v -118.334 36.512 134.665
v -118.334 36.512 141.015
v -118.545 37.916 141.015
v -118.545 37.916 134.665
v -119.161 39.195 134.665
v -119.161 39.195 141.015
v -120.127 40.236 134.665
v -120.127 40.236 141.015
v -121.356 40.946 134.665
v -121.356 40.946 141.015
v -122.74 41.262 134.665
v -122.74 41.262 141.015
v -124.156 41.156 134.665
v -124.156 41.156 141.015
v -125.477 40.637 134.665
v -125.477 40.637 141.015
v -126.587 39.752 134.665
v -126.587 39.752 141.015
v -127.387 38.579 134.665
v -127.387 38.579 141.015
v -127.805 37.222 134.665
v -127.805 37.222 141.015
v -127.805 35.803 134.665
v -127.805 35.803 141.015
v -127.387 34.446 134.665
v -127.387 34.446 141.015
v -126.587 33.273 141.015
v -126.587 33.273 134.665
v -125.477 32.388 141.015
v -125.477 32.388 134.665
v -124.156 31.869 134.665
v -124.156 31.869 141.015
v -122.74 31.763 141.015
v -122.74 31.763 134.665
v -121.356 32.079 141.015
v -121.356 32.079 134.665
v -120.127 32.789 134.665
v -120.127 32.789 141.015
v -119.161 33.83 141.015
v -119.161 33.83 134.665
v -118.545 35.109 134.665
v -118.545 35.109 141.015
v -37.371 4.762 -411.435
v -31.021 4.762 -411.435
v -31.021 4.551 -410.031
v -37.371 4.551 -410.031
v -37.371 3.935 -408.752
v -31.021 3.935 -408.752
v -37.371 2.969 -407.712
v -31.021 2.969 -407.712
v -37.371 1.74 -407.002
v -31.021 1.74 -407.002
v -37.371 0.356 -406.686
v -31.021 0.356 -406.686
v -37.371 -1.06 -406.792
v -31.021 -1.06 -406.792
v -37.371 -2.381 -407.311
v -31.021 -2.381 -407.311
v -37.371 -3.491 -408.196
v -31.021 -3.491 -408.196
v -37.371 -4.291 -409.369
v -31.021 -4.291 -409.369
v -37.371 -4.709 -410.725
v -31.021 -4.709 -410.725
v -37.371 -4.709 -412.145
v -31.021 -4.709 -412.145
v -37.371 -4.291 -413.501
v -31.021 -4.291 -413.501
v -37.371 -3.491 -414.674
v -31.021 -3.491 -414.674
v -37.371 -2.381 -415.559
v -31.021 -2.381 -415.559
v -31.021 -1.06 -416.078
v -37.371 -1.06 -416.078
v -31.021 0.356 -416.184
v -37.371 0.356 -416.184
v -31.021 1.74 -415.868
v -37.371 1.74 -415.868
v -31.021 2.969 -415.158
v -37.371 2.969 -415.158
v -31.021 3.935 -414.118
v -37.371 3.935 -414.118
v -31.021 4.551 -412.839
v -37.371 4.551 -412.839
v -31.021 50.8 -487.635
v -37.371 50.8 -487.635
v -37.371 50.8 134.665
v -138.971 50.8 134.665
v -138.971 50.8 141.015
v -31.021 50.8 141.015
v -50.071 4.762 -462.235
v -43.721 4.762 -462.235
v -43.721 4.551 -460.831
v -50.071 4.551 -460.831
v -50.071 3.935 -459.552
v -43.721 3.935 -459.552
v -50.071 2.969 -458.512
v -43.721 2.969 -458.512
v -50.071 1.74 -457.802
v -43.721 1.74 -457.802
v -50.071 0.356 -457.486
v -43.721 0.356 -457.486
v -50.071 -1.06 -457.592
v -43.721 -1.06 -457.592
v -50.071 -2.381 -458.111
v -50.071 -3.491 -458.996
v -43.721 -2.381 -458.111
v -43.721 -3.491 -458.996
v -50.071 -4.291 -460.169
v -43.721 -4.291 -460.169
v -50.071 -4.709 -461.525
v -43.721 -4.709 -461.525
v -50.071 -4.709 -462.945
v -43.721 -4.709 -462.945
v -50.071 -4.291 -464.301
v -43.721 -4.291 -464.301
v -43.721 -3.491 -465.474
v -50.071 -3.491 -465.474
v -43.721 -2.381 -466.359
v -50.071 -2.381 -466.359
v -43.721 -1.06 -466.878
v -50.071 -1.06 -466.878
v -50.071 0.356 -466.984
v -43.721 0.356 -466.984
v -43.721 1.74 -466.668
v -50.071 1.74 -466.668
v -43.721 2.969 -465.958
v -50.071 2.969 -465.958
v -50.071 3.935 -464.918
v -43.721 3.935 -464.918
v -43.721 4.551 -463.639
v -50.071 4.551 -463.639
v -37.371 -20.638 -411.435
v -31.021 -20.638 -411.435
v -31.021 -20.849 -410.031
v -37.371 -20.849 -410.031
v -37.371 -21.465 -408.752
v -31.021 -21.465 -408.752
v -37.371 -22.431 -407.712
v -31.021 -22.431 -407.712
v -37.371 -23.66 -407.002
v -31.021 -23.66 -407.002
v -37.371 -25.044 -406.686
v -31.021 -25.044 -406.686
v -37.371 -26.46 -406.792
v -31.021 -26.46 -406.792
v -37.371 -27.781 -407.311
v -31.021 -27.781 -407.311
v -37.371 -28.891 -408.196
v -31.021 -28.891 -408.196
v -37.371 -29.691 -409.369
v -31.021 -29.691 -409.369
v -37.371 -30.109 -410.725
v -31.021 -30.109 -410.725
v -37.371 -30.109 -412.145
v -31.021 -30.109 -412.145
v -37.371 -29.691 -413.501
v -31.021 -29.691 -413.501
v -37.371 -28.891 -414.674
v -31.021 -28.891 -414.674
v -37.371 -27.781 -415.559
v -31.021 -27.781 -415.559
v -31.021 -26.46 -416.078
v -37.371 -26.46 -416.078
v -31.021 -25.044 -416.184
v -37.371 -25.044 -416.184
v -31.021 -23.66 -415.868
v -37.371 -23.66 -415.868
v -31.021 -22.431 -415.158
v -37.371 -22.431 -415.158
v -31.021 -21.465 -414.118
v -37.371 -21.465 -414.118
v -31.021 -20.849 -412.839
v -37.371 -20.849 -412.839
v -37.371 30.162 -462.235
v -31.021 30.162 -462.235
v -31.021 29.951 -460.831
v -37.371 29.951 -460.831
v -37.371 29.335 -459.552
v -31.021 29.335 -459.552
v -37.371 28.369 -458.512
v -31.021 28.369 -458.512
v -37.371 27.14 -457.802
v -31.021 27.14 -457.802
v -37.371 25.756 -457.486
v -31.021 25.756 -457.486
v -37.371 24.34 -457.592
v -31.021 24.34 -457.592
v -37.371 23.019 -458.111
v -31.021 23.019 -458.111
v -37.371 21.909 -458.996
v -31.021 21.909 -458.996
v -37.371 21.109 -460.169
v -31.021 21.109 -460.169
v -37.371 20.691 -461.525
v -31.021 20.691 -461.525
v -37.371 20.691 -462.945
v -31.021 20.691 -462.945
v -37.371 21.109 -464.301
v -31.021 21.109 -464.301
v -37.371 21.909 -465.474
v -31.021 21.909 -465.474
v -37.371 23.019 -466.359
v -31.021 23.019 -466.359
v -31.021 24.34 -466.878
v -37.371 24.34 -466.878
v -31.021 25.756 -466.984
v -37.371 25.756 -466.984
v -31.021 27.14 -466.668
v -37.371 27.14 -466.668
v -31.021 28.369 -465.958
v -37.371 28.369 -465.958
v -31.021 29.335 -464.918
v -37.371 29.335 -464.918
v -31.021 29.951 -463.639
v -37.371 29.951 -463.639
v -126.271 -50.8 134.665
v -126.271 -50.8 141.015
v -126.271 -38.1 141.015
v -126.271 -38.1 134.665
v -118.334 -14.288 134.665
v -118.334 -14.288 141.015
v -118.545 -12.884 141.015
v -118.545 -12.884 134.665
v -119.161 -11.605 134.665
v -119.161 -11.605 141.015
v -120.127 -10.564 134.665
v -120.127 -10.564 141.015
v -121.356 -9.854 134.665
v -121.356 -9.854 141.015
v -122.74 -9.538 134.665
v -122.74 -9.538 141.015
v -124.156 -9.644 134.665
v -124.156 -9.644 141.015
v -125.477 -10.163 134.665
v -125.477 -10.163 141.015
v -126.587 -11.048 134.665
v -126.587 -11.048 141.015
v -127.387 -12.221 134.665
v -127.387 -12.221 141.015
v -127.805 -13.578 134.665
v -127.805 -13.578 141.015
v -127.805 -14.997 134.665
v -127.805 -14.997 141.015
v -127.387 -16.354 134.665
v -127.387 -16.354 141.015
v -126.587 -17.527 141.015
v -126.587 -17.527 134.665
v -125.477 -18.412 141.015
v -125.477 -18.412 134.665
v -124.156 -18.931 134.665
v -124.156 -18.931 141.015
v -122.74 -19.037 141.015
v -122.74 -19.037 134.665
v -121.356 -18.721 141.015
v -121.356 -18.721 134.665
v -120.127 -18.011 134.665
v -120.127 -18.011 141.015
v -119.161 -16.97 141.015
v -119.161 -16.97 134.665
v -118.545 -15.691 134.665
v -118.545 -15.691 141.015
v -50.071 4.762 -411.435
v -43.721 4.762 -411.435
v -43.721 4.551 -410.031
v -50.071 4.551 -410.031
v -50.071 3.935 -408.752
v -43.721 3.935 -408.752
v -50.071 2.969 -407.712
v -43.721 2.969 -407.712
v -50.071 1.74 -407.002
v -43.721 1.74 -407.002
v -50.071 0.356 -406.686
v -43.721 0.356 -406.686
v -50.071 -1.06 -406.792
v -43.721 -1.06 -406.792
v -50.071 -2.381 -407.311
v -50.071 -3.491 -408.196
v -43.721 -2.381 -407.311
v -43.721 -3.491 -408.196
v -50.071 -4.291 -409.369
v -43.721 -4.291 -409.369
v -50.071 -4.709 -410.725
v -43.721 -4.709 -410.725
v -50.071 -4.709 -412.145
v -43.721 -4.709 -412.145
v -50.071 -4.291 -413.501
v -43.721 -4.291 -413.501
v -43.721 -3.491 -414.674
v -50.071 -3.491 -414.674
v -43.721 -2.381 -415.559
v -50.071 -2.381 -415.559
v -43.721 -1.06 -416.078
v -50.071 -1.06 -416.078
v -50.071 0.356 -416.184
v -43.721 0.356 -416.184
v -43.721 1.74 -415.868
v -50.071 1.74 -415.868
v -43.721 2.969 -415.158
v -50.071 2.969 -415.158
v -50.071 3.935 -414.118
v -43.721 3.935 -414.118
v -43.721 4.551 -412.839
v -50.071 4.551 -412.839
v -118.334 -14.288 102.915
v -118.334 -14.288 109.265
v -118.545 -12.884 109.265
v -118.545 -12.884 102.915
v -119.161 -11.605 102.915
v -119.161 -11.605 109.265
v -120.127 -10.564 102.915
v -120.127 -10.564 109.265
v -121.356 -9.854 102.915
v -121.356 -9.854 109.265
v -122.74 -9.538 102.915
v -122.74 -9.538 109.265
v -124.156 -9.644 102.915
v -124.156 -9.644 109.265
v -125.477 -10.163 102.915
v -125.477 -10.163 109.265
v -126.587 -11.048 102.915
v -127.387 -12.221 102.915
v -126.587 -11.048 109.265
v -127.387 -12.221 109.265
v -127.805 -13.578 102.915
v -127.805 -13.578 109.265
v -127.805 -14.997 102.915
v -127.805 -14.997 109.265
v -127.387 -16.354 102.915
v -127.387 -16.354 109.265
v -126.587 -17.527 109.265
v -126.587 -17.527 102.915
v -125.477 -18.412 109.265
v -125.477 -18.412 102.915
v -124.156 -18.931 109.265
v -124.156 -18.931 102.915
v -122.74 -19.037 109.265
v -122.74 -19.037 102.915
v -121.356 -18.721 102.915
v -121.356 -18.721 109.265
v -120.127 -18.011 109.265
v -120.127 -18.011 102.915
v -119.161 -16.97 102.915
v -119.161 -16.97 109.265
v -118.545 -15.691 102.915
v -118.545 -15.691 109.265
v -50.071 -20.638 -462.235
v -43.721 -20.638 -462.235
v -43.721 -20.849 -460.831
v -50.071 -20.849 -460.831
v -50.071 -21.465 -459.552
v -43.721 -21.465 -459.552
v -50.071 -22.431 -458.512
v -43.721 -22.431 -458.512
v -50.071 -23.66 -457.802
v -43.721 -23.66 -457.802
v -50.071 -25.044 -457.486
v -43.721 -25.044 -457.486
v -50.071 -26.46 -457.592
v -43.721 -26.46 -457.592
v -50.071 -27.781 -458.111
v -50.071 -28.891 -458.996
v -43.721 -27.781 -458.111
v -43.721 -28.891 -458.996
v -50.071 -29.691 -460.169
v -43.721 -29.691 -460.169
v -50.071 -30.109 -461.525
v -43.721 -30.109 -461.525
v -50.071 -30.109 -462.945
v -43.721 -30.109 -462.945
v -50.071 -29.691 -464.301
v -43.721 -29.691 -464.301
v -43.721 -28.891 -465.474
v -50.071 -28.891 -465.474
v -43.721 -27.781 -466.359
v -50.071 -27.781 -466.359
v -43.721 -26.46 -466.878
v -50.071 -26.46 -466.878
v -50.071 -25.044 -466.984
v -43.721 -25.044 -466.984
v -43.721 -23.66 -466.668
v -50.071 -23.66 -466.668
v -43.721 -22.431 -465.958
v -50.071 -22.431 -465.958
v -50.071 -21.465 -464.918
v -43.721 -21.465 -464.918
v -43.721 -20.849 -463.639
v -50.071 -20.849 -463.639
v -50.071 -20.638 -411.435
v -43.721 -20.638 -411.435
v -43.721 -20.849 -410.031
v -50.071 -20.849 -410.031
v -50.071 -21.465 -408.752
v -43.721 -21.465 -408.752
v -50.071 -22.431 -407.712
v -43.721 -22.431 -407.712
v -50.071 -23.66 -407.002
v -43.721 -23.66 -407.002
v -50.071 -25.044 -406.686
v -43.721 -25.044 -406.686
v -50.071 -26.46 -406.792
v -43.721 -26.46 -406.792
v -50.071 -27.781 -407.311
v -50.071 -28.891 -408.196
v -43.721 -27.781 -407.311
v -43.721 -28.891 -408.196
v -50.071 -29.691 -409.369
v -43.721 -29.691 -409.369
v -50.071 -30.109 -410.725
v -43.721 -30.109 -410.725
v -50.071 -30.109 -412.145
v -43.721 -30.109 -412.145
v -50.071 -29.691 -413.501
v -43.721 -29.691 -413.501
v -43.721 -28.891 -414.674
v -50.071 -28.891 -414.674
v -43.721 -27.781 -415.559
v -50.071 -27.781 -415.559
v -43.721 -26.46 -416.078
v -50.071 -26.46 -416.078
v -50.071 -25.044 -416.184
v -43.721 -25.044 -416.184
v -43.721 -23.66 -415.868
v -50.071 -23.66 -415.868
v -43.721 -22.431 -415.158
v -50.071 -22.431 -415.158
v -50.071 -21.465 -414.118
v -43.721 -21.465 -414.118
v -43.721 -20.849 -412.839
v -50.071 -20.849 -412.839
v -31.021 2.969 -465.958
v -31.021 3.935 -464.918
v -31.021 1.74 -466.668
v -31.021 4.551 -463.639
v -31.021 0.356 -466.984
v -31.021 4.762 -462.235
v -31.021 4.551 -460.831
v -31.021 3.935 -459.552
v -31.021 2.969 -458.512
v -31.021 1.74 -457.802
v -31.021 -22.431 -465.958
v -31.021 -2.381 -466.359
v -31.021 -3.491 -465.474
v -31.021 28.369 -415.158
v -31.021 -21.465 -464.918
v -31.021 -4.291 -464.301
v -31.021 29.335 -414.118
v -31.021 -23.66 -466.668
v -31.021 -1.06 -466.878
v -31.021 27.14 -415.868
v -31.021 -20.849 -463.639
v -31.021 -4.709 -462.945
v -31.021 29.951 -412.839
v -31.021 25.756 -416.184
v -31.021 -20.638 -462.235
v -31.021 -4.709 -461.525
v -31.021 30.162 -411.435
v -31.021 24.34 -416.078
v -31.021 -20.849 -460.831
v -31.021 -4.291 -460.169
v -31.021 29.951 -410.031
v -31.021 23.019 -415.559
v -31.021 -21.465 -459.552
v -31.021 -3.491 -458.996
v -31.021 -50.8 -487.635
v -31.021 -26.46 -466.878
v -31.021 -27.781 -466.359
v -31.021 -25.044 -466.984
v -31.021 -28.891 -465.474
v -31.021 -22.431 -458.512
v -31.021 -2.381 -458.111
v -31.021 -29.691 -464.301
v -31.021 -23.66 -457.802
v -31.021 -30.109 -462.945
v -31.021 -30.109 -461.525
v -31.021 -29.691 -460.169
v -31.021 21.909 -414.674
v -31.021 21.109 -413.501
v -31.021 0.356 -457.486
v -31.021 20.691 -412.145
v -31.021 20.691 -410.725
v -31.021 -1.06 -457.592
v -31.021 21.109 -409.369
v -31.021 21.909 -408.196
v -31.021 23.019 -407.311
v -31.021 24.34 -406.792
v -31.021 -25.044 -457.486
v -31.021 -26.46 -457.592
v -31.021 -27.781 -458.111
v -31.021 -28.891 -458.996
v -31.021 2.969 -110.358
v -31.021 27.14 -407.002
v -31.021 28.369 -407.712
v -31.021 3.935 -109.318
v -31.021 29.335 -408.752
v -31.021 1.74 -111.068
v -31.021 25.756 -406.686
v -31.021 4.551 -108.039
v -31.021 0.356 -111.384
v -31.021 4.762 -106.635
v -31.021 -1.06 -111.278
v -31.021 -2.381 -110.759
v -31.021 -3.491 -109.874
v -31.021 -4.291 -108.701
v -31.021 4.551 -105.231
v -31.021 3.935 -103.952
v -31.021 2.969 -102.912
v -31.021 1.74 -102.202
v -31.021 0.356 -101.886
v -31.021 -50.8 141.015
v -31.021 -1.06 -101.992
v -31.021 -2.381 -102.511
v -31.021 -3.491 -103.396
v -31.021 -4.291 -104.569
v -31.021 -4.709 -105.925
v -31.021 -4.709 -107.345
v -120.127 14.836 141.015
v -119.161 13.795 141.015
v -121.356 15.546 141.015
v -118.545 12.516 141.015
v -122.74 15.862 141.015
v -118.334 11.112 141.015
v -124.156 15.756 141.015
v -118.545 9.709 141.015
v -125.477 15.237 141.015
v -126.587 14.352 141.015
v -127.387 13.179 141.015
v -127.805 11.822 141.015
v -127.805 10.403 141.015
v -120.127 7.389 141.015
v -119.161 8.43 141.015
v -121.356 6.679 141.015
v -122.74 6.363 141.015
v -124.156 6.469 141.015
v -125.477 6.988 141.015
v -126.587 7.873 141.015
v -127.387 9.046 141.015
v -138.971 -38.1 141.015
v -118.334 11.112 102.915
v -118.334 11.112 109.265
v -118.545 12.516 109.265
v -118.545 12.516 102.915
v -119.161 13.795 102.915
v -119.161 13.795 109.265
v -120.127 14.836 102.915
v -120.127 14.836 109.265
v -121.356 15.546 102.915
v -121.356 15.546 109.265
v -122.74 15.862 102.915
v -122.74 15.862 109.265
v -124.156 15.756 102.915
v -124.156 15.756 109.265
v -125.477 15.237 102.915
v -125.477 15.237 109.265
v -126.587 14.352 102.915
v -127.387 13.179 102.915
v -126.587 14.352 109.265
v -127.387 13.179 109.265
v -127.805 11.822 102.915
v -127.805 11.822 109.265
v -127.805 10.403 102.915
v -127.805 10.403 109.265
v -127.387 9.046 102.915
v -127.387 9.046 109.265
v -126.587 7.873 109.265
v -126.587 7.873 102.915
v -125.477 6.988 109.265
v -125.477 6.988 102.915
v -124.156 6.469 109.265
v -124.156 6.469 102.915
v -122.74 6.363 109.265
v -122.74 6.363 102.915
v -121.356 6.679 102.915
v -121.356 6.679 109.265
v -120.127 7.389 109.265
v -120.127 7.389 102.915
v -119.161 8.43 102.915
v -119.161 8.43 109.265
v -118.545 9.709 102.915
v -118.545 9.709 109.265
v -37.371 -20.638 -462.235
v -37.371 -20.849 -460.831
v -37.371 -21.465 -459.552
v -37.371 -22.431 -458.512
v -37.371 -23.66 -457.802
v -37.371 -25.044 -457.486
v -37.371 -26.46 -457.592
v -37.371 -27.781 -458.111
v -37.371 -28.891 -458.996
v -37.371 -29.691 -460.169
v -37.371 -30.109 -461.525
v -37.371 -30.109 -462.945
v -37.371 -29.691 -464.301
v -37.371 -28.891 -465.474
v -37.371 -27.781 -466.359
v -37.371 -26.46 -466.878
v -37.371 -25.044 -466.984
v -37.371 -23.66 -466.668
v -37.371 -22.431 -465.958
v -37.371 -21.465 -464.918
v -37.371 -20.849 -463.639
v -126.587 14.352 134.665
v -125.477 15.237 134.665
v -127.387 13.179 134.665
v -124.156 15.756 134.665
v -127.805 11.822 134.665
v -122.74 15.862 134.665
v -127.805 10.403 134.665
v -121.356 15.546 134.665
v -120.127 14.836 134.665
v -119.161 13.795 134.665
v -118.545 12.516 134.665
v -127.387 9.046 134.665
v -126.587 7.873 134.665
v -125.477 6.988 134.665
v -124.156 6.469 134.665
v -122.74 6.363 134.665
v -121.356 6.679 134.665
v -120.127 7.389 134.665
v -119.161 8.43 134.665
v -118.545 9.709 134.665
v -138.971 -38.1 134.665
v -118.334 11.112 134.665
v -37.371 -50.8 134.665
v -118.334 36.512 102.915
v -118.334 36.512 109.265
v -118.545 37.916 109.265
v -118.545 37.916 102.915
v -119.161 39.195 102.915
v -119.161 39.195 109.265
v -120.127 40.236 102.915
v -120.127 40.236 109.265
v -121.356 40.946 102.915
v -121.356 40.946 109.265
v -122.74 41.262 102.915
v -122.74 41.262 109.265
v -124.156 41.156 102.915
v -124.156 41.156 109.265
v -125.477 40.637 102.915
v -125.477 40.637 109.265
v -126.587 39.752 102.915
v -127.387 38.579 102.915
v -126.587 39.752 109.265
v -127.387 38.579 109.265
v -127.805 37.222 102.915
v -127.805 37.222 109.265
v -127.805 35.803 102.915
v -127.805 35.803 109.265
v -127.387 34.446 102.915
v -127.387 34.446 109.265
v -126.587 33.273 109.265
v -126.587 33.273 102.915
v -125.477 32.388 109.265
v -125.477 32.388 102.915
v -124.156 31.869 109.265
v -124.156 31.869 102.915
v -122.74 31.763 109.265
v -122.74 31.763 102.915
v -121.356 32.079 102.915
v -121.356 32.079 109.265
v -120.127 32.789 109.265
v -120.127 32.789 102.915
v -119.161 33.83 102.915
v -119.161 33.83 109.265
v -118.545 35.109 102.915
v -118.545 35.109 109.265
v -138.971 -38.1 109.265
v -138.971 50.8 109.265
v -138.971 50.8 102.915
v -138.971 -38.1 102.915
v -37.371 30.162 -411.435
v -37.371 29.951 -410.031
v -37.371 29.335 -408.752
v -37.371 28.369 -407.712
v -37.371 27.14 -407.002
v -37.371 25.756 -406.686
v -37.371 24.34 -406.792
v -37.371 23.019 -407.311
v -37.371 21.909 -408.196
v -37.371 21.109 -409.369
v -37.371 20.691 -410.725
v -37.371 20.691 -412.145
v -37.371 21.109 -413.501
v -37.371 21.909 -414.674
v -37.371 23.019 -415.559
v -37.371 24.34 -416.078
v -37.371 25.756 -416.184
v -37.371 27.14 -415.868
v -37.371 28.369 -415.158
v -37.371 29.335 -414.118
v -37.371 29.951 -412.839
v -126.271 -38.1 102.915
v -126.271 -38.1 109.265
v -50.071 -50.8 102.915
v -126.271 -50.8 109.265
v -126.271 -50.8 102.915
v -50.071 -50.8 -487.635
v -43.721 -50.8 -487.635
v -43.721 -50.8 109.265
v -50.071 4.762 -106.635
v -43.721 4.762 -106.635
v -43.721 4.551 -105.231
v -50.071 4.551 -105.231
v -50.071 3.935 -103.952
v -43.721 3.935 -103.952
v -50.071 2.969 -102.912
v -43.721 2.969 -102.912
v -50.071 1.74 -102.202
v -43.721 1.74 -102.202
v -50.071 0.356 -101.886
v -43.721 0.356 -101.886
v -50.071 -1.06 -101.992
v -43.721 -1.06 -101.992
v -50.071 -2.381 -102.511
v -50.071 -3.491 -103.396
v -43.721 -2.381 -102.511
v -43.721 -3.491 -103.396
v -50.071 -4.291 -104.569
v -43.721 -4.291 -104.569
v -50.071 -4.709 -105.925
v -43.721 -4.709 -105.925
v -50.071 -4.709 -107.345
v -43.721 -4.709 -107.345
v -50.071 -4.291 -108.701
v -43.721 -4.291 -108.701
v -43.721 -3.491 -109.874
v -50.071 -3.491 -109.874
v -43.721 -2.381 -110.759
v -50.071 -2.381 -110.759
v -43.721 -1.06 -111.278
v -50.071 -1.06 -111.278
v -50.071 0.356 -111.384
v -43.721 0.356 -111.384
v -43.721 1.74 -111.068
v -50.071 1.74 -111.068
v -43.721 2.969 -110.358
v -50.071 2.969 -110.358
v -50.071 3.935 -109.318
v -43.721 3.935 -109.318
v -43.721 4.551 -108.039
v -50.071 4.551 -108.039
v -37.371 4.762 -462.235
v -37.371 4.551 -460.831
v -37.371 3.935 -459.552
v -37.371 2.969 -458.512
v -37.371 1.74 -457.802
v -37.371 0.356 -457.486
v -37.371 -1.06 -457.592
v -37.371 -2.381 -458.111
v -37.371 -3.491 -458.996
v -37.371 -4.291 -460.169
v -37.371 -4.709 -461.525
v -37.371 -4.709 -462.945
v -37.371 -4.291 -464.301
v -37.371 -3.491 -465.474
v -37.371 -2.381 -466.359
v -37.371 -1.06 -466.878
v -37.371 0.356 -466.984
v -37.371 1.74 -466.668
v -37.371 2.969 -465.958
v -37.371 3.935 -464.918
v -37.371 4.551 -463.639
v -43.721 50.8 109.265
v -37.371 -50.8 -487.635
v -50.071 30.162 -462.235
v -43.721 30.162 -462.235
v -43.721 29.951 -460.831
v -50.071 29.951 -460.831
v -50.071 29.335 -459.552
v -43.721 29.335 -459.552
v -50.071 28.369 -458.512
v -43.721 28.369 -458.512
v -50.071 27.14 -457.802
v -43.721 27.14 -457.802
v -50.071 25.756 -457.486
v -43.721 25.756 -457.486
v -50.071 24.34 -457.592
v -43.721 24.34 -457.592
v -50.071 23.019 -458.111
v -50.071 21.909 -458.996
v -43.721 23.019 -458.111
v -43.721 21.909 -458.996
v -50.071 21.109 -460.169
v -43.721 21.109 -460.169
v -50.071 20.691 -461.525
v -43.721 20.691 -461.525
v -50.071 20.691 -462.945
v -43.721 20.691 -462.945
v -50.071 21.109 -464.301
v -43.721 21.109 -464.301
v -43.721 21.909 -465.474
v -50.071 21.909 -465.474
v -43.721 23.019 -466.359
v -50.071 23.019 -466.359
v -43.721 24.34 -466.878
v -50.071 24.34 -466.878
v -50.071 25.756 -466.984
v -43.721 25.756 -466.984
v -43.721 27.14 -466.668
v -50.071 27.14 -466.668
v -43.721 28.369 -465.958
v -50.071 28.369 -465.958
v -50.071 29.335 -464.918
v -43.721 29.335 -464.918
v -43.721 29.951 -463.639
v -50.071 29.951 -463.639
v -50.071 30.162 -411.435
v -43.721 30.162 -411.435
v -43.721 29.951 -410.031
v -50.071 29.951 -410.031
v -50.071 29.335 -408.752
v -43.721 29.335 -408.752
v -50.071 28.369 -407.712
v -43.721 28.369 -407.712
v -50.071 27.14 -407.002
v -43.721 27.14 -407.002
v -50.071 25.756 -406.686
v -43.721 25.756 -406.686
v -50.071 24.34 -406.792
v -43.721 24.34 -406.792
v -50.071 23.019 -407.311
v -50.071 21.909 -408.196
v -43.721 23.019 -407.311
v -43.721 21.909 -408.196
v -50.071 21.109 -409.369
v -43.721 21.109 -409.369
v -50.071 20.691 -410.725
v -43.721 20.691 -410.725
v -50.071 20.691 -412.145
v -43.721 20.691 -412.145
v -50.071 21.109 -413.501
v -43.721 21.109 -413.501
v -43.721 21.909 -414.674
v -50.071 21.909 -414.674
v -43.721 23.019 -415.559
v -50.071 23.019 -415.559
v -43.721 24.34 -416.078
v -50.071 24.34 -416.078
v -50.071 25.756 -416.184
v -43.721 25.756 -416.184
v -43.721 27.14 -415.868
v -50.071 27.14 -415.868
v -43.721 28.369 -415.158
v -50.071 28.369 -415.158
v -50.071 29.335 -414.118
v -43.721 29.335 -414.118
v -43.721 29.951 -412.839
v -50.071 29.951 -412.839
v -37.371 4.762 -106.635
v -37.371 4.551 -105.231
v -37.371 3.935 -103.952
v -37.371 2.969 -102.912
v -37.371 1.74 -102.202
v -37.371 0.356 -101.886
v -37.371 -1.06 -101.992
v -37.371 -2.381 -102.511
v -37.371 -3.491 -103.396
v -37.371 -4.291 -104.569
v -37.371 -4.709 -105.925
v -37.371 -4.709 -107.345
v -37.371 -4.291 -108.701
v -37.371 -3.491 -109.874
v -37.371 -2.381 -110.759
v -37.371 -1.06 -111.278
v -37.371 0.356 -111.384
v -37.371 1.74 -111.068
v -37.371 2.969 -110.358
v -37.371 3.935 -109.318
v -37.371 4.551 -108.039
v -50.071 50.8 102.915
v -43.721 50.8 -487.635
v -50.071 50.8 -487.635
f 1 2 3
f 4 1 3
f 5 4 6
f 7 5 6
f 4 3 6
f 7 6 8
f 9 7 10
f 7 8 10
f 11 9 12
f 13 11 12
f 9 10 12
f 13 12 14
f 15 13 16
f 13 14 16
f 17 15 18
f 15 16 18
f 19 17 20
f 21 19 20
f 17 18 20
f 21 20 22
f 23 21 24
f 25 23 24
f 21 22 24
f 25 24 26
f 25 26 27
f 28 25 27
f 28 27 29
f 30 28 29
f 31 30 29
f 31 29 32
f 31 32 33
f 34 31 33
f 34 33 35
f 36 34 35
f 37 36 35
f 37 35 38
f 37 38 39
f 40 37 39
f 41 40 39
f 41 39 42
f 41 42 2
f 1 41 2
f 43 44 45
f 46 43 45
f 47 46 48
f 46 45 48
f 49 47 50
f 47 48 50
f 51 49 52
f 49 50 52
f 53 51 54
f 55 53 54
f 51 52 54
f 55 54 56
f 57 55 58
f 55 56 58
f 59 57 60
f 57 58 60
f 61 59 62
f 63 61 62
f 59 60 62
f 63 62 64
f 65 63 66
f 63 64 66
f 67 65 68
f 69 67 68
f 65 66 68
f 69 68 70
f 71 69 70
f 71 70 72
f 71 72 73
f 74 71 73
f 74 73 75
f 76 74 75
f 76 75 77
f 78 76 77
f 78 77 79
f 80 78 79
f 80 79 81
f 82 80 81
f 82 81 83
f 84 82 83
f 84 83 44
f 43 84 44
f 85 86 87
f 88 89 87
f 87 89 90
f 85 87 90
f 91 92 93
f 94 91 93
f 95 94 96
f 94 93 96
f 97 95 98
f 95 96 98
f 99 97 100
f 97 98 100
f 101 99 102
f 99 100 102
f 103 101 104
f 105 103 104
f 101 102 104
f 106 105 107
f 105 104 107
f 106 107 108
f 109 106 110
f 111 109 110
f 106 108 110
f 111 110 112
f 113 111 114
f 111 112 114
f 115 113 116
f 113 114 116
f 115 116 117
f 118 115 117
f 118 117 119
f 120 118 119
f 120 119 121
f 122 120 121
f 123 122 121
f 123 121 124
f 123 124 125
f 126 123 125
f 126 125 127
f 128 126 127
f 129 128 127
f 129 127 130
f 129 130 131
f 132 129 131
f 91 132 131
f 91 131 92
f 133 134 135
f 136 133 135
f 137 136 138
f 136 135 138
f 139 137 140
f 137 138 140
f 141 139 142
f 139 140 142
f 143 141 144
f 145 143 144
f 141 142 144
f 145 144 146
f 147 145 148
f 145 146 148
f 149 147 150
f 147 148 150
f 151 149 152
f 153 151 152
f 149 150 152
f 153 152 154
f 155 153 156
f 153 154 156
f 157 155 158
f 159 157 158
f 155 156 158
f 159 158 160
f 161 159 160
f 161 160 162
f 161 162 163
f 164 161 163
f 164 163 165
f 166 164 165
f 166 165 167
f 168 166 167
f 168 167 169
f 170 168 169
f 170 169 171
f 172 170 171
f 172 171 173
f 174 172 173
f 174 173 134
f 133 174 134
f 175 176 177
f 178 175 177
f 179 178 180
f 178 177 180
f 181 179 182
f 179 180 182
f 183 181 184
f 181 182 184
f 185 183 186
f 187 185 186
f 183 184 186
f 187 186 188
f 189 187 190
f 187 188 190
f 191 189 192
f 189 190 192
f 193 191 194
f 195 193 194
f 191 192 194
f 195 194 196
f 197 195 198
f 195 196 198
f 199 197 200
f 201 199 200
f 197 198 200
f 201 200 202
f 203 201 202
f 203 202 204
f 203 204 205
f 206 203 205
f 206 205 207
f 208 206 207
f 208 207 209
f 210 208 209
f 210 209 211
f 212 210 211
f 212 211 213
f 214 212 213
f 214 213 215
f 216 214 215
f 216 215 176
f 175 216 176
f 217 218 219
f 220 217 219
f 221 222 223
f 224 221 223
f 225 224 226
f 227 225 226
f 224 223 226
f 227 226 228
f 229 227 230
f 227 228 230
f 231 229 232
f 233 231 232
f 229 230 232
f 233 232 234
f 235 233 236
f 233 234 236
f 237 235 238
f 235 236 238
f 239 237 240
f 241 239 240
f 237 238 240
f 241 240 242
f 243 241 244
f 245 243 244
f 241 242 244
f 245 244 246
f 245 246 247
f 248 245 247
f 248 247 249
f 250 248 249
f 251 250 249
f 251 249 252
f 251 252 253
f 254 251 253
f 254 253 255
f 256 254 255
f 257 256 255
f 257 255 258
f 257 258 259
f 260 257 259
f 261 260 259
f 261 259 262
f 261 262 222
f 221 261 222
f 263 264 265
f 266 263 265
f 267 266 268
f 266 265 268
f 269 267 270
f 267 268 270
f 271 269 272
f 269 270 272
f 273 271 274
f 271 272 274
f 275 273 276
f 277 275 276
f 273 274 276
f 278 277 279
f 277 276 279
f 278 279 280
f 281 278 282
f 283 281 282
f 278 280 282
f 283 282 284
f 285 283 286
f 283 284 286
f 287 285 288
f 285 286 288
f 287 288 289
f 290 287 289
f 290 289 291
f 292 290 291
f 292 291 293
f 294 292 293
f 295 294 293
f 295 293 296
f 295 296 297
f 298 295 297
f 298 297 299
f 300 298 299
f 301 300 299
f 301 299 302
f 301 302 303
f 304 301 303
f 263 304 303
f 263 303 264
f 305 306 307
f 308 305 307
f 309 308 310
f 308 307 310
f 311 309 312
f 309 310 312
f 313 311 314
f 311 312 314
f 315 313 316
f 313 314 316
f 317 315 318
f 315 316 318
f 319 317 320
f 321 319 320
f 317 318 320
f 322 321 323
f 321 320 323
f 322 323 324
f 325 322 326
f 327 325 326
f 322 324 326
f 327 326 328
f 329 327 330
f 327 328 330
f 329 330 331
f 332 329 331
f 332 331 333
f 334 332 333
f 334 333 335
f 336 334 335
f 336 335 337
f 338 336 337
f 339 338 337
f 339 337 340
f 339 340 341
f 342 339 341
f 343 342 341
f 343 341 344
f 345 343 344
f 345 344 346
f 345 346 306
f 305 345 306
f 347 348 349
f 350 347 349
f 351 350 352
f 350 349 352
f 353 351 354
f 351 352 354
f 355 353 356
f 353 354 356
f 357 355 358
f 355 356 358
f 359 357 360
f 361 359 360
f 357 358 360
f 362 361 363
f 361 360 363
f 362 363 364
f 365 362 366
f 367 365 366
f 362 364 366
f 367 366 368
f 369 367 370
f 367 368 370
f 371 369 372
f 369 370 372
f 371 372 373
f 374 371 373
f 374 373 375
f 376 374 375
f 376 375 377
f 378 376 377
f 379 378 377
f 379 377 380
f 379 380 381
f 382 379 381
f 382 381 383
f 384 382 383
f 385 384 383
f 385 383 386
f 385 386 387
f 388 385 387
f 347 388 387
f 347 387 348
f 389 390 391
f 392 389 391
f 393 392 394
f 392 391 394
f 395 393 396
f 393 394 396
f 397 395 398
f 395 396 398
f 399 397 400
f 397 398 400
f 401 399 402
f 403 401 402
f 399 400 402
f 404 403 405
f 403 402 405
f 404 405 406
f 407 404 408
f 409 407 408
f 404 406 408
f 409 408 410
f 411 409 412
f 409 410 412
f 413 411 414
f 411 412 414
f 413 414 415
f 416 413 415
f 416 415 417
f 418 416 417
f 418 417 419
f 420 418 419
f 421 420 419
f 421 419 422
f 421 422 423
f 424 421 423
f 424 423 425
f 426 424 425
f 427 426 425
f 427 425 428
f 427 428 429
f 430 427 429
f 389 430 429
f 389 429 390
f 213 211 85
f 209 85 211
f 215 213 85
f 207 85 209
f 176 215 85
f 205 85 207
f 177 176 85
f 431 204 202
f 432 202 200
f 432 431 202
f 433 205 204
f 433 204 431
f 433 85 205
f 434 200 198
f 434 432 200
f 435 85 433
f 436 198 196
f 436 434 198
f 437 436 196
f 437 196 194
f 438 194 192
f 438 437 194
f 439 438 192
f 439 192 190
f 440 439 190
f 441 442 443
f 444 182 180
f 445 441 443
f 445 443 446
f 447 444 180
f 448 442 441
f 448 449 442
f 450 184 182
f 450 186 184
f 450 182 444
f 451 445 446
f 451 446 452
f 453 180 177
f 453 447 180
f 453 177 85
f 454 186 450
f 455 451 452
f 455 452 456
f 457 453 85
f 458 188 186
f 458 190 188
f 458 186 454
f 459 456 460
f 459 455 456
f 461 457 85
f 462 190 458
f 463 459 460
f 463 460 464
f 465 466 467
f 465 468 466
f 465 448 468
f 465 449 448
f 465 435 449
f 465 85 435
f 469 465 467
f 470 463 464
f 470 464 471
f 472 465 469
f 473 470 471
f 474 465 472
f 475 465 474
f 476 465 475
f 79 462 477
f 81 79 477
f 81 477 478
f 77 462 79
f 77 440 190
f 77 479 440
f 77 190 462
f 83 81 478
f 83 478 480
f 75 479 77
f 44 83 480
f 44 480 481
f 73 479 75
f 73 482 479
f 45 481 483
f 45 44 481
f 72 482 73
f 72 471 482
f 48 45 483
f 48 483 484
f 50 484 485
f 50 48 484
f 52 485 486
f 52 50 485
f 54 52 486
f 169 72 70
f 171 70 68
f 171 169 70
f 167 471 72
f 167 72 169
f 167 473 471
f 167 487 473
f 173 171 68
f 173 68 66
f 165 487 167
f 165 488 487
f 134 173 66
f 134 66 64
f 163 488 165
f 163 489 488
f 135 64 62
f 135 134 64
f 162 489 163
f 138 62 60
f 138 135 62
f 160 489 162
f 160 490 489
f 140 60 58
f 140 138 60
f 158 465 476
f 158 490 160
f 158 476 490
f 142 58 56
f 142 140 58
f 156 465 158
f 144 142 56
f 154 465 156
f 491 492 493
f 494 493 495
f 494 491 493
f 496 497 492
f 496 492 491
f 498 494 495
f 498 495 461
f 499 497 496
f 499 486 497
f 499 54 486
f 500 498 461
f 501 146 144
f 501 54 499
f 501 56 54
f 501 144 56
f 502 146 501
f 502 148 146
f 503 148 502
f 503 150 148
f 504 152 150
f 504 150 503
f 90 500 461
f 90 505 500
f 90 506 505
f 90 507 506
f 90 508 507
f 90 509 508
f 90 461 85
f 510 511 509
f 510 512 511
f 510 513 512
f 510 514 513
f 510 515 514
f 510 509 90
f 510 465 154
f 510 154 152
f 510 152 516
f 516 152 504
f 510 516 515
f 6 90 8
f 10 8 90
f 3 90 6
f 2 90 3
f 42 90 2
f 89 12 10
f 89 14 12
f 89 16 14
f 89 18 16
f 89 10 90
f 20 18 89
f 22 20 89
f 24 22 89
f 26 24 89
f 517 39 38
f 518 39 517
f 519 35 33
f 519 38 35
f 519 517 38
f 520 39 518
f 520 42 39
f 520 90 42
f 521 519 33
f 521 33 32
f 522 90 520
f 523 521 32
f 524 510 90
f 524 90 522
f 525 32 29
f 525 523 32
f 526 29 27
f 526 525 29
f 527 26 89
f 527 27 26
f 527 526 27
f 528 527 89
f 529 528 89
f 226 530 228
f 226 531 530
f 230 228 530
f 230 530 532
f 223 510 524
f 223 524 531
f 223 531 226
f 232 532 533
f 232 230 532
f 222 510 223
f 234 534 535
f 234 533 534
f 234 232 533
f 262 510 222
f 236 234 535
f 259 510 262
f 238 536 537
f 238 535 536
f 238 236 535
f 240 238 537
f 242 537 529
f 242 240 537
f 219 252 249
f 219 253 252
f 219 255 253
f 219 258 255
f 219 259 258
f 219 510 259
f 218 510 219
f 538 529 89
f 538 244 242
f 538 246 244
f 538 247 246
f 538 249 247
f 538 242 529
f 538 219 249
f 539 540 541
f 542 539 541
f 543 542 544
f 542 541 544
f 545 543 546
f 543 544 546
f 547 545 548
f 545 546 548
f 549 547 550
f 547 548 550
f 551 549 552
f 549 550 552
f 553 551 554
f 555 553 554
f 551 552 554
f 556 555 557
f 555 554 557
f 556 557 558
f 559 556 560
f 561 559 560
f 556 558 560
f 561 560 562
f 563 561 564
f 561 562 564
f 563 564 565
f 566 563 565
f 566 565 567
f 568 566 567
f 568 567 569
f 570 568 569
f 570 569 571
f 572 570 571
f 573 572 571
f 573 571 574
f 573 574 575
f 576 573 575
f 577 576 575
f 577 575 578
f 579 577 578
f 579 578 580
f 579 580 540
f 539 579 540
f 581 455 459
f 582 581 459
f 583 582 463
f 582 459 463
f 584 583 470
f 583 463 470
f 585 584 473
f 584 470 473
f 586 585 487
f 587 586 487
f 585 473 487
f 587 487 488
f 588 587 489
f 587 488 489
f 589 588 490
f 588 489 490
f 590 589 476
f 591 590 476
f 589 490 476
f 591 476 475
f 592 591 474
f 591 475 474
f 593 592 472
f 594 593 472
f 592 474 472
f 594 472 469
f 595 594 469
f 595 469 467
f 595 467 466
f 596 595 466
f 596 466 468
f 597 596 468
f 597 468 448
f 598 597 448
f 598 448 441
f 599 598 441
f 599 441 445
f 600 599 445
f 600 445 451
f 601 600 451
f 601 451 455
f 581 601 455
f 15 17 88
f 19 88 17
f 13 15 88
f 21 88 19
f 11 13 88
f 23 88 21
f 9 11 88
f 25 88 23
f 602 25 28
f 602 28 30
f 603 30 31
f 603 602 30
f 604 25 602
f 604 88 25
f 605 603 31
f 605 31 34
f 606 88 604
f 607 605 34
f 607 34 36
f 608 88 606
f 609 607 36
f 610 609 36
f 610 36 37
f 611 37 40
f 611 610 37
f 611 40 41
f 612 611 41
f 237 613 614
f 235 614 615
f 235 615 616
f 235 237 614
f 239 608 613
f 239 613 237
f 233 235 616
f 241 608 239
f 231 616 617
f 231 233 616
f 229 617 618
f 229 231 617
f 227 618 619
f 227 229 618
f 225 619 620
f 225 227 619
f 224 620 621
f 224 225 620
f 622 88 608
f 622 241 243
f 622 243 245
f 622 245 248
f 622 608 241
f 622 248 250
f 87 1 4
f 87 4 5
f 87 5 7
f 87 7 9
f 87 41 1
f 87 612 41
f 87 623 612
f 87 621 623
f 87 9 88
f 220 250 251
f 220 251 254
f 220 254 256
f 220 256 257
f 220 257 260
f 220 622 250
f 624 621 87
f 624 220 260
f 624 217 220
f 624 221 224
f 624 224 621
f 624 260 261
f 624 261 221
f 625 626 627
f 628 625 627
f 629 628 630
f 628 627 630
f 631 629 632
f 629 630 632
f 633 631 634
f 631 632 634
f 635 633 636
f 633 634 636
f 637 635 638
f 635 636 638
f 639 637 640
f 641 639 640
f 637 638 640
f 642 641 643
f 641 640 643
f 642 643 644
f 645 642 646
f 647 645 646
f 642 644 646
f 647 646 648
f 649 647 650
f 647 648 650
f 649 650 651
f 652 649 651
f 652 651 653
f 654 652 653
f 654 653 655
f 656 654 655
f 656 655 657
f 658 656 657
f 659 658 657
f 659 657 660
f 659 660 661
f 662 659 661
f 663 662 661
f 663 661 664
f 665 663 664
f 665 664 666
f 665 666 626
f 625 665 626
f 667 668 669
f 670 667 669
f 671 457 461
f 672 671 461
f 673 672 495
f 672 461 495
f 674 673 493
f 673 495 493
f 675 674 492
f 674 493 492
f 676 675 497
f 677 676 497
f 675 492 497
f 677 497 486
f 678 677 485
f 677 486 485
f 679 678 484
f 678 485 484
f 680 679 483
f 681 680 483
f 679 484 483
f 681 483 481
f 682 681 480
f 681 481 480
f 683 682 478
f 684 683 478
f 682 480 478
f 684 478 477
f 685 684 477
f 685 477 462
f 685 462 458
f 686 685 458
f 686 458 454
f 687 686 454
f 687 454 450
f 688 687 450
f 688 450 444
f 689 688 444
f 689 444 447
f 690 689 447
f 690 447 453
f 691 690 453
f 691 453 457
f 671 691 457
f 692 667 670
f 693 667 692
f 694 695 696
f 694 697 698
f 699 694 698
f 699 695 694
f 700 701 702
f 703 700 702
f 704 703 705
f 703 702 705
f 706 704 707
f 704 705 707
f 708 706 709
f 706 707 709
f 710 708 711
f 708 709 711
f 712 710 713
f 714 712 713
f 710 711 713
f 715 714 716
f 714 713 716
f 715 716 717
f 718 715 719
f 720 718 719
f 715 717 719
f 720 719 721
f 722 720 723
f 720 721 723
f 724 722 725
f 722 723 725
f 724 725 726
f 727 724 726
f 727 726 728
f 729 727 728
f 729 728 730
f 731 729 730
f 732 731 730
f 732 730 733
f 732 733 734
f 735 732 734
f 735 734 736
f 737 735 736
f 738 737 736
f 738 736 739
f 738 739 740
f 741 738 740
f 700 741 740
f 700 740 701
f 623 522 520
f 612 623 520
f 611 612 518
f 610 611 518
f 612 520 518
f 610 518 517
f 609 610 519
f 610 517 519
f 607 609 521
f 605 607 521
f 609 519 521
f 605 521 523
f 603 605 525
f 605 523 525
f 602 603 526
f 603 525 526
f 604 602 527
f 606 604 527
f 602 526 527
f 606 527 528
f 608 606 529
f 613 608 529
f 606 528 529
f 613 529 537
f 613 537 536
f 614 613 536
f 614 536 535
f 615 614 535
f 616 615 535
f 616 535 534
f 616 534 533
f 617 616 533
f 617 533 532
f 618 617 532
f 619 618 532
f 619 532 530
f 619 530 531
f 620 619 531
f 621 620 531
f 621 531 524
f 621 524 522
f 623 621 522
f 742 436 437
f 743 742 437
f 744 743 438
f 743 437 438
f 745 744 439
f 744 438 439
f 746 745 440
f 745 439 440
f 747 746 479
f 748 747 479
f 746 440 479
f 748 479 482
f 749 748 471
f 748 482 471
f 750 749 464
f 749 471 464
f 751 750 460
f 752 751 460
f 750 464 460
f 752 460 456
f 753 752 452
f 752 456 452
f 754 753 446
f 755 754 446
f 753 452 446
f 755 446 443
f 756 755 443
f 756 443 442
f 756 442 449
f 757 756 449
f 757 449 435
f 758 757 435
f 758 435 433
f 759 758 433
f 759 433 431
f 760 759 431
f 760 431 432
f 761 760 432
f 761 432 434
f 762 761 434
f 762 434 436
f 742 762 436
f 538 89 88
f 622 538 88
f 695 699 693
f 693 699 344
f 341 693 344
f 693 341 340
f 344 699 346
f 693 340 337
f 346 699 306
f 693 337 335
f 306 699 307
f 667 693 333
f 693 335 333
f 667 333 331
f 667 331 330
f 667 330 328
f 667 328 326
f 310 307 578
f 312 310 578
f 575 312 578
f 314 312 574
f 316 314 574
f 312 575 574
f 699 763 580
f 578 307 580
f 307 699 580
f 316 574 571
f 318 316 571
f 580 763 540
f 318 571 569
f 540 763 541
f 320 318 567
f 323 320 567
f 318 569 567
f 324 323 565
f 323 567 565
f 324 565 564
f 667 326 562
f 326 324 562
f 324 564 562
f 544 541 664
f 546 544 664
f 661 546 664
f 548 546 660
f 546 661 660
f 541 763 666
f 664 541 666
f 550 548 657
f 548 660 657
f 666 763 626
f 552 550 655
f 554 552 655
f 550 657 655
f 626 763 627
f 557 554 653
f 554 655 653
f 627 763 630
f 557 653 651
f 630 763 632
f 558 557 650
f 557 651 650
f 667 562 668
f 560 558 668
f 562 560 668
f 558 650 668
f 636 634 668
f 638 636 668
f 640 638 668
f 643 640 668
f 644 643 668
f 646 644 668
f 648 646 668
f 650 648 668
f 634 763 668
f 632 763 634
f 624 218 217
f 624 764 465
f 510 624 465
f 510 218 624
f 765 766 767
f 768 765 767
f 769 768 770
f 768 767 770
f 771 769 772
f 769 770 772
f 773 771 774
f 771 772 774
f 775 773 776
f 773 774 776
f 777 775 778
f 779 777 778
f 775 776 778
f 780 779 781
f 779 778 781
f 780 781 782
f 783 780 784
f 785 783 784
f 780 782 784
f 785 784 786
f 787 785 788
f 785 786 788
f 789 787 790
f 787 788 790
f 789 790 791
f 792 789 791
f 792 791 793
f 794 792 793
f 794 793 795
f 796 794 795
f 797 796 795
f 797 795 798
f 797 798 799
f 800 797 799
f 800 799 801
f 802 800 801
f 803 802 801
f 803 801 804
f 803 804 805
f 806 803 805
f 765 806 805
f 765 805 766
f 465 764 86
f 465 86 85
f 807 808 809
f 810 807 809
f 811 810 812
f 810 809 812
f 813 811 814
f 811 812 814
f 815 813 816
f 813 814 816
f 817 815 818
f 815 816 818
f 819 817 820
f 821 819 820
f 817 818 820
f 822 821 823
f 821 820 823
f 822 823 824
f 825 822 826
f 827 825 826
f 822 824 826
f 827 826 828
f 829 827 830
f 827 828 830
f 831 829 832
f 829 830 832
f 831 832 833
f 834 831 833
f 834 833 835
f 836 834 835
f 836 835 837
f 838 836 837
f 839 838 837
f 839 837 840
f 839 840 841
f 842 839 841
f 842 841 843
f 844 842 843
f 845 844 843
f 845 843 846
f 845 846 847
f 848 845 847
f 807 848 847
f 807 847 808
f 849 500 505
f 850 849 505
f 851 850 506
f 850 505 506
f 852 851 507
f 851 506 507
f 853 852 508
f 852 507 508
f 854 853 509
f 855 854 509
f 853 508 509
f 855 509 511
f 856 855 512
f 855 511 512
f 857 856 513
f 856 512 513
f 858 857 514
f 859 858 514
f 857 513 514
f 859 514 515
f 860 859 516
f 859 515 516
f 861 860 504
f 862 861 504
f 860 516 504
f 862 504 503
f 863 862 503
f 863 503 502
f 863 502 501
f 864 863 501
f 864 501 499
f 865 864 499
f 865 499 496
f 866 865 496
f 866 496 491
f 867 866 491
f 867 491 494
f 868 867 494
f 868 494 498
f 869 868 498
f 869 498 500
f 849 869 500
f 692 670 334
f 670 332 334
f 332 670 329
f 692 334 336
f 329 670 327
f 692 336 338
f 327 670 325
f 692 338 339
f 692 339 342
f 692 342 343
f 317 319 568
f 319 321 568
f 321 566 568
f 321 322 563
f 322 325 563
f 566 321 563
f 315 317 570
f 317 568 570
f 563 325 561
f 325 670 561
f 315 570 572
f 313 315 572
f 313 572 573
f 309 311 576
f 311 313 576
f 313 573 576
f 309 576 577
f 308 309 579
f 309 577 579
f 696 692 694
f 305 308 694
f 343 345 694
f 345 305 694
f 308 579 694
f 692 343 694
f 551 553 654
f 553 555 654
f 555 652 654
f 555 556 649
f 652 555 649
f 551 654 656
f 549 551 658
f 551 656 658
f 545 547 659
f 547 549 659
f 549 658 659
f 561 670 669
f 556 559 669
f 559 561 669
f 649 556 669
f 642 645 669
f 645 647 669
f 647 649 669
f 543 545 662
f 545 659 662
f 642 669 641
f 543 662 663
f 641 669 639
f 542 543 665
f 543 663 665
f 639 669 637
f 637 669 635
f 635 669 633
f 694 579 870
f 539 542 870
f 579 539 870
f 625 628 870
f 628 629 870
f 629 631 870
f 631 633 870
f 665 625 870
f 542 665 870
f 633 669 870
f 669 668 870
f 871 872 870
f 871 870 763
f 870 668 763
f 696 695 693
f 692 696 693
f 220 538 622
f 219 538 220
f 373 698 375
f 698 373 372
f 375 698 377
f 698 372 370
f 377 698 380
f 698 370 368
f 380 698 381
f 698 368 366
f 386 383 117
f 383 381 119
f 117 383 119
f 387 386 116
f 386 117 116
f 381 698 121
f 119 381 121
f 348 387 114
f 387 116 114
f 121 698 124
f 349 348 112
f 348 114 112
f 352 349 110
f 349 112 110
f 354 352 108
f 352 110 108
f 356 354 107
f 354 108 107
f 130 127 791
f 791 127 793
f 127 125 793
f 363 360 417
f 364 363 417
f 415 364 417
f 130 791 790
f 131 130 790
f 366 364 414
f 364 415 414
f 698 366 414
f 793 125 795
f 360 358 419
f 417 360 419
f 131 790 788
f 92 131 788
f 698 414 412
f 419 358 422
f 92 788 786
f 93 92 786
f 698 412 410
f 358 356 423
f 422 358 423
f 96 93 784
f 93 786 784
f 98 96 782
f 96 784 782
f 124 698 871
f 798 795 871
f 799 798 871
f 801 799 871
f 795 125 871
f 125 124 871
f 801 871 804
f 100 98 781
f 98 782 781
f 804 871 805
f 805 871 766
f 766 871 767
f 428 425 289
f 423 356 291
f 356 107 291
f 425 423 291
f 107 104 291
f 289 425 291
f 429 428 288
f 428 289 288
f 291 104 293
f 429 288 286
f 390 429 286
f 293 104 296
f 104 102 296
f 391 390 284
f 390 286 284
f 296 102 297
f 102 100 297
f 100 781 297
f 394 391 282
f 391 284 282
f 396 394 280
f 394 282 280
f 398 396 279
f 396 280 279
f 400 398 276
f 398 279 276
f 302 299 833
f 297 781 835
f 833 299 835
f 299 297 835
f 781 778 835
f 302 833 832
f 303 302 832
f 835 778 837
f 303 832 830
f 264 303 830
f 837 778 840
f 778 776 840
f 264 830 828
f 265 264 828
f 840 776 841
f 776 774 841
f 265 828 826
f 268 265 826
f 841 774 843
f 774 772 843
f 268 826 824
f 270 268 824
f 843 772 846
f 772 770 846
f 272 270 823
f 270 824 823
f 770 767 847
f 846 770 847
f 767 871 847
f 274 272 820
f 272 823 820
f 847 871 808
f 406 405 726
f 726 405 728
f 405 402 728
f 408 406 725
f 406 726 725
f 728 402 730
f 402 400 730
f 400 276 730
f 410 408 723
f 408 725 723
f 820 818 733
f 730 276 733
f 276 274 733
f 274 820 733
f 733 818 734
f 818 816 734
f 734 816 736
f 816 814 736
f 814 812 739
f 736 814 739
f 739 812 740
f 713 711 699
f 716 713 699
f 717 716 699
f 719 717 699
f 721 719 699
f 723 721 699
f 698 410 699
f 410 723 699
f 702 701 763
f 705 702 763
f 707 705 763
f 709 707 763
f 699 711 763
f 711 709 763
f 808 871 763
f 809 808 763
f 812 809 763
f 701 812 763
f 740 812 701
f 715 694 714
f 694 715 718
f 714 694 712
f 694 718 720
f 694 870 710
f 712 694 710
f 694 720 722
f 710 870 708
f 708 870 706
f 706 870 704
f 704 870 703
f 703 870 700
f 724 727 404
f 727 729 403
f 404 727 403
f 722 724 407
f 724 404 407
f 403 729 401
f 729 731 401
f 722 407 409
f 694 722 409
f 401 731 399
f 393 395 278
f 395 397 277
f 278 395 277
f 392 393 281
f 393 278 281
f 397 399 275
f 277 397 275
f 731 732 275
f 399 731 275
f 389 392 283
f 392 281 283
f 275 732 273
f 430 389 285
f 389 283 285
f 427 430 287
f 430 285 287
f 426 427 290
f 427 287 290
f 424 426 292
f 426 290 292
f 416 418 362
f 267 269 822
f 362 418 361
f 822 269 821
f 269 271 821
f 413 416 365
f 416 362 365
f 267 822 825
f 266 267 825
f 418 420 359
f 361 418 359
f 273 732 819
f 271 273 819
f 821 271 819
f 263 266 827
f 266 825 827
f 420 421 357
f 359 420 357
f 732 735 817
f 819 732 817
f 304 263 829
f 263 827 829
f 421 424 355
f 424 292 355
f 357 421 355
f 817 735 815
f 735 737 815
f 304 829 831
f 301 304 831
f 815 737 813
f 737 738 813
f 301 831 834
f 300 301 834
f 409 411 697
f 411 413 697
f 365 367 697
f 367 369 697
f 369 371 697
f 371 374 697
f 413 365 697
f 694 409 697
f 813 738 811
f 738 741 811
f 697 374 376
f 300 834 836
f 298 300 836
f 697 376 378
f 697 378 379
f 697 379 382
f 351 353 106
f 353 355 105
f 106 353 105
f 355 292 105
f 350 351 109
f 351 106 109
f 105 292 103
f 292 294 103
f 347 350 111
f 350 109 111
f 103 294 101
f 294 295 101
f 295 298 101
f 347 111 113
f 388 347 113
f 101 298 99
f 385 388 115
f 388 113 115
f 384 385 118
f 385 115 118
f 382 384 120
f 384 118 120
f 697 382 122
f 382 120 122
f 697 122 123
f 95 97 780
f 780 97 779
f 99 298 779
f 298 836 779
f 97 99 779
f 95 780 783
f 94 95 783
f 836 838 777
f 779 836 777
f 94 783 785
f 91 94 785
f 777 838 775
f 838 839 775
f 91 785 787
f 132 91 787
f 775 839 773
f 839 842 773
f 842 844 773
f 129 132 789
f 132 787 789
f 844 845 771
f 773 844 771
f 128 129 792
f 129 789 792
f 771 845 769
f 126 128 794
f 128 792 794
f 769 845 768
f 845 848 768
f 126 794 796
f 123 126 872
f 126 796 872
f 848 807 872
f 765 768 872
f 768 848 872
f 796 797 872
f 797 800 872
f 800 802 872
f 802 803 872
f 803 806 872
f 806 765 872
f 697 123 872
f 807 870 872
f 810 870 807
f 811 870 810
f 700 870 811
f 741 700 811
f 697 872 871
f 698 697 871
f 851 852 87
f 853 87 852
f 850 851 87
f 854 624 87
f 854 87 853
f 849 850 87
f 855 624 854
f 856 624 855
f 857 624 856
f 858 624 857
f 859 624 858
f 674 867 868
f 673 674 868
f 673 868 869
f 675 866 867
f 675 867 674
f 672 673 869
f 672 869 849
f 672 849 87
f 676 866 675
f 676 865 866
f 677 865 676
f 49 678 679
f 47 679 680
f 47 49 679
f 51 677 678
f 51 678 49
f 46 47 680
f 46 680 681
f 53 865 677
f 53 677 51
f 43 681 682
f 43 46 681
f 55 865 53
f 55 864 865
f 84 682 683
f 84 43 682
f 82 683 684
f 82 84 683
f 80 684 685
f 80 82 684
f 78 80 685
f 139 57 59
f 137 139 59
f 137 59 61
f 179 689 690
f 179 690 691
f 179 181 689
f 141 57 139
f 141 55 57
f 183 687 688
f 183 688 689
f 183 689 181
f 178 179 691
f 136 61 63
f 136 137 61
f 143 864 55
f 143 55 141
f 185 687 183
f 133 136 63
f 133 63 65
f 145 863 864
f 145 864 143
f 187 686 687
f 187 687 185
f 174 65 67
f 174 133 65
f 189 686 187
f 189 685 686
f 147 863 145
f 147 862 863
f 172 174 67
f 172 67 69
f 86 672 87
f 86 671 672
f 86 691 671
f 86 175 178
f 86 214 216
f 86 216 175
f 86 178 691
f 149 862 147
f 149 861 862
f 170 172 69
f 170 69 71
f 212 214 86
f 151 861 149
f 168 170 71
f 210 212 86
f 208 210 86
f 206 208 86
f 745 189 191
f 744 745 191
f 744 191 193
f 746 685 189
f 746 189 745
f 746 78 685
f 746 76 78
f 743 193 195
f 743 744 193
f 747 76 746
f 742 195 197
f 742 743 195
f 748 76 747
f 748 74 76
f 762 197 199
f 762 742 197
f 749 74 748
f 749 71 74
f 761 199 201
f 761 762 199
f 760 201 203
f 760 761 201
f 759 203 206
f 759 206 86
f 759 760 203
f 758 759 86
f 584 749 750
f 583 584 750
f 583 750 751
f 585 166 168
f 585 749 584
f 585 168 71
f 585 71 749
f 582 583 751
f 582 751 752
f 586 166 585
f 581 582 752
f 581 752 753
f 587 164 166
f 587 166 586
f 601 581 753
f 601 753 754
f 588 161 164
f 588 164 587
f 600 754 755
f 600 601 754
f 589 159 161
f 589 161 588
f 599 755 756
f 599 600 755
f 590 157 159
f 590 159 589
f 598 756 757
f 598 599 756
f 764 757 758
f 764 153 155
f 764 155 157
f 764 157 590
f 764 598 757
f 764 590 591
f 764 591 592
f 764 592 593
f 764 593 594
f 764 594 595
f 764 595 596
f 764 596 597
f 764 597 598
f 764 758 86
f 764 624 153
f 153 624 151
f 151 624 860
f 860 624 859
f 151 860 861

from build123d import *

# Parameters (mm, degrees)
F1_DEPTH = 50.8
F2_R     = 4.7625
F3_DEPTH = 107.951
F4_R     = 4.7625
F4_W     = 12.7
F4_H     = 12.7
F5_DEPTH = 628.651


with BuildPart() as f1:
    # F0 (on Front) → F1 (new body, symmetric)
    with BuildSketch(Plane.XZ):
        Polygon((-43.721065, 109.265013), (-138.971065, 109.265013), (-138.971065, 102.915013), (-50.071065, 102.915013), (-50.071065, -487.634987), (-43.721065, -487.634987), align=None)
        Polygon((-138.971065, 134.665013), (-37.371065, 134.665013), (-37.371065, -487.634987), (-31.021065, -487.634987), (-31.021065, 141.015013), (-138.971065, 141.015013), align=None)
    extrude(amount=F1_DEPTH, both=True)

    # F2 (on face) → F3 (cut, through all)
    with BuildSketch(Plane.YZ.offset(-31.021065)):
        with Locations((-25.4, -462.234987)):
            Circle(F2_R)
        with Locations((-25.4, -411.434987)):
            Circle(F2_R)
        with Locations((0, -462.234987)):
            Circle(F2_R)
        with Locations((0, -411.434987)):
            Circle(F2_R)
        with Locations((25.4, -462.234987)):
            Circle(F2_R)
        with Locations((25.4, -411.434987)):
            Circle(F2_R)
        with Locations((0, -106.634987)):
            Circle(F2_R)
    extrude(amount=-F3_DEPTH, mode=Mode.SUBTRACT)

    # F4 (on face) → F5 (cut, through all)
    with BuildSketch(Plane.XY.offset(141.015013)):
        with Locations((-123.096065, -14.2875)):
            Circle(F4_R)
        with Locations((-123.096065, 11.1125)):
            Circle(F4_R)
        with Locations((-123.096065, 36.5125)):
            Circle(F4_R)
        with Locations((-132.621065, -44.45)):
            Rectangle(F4_W, F4_H)
    extrude(amount=-F5_DEPTH, mode=Mode.SUBTRACT)


solid = f1.part
